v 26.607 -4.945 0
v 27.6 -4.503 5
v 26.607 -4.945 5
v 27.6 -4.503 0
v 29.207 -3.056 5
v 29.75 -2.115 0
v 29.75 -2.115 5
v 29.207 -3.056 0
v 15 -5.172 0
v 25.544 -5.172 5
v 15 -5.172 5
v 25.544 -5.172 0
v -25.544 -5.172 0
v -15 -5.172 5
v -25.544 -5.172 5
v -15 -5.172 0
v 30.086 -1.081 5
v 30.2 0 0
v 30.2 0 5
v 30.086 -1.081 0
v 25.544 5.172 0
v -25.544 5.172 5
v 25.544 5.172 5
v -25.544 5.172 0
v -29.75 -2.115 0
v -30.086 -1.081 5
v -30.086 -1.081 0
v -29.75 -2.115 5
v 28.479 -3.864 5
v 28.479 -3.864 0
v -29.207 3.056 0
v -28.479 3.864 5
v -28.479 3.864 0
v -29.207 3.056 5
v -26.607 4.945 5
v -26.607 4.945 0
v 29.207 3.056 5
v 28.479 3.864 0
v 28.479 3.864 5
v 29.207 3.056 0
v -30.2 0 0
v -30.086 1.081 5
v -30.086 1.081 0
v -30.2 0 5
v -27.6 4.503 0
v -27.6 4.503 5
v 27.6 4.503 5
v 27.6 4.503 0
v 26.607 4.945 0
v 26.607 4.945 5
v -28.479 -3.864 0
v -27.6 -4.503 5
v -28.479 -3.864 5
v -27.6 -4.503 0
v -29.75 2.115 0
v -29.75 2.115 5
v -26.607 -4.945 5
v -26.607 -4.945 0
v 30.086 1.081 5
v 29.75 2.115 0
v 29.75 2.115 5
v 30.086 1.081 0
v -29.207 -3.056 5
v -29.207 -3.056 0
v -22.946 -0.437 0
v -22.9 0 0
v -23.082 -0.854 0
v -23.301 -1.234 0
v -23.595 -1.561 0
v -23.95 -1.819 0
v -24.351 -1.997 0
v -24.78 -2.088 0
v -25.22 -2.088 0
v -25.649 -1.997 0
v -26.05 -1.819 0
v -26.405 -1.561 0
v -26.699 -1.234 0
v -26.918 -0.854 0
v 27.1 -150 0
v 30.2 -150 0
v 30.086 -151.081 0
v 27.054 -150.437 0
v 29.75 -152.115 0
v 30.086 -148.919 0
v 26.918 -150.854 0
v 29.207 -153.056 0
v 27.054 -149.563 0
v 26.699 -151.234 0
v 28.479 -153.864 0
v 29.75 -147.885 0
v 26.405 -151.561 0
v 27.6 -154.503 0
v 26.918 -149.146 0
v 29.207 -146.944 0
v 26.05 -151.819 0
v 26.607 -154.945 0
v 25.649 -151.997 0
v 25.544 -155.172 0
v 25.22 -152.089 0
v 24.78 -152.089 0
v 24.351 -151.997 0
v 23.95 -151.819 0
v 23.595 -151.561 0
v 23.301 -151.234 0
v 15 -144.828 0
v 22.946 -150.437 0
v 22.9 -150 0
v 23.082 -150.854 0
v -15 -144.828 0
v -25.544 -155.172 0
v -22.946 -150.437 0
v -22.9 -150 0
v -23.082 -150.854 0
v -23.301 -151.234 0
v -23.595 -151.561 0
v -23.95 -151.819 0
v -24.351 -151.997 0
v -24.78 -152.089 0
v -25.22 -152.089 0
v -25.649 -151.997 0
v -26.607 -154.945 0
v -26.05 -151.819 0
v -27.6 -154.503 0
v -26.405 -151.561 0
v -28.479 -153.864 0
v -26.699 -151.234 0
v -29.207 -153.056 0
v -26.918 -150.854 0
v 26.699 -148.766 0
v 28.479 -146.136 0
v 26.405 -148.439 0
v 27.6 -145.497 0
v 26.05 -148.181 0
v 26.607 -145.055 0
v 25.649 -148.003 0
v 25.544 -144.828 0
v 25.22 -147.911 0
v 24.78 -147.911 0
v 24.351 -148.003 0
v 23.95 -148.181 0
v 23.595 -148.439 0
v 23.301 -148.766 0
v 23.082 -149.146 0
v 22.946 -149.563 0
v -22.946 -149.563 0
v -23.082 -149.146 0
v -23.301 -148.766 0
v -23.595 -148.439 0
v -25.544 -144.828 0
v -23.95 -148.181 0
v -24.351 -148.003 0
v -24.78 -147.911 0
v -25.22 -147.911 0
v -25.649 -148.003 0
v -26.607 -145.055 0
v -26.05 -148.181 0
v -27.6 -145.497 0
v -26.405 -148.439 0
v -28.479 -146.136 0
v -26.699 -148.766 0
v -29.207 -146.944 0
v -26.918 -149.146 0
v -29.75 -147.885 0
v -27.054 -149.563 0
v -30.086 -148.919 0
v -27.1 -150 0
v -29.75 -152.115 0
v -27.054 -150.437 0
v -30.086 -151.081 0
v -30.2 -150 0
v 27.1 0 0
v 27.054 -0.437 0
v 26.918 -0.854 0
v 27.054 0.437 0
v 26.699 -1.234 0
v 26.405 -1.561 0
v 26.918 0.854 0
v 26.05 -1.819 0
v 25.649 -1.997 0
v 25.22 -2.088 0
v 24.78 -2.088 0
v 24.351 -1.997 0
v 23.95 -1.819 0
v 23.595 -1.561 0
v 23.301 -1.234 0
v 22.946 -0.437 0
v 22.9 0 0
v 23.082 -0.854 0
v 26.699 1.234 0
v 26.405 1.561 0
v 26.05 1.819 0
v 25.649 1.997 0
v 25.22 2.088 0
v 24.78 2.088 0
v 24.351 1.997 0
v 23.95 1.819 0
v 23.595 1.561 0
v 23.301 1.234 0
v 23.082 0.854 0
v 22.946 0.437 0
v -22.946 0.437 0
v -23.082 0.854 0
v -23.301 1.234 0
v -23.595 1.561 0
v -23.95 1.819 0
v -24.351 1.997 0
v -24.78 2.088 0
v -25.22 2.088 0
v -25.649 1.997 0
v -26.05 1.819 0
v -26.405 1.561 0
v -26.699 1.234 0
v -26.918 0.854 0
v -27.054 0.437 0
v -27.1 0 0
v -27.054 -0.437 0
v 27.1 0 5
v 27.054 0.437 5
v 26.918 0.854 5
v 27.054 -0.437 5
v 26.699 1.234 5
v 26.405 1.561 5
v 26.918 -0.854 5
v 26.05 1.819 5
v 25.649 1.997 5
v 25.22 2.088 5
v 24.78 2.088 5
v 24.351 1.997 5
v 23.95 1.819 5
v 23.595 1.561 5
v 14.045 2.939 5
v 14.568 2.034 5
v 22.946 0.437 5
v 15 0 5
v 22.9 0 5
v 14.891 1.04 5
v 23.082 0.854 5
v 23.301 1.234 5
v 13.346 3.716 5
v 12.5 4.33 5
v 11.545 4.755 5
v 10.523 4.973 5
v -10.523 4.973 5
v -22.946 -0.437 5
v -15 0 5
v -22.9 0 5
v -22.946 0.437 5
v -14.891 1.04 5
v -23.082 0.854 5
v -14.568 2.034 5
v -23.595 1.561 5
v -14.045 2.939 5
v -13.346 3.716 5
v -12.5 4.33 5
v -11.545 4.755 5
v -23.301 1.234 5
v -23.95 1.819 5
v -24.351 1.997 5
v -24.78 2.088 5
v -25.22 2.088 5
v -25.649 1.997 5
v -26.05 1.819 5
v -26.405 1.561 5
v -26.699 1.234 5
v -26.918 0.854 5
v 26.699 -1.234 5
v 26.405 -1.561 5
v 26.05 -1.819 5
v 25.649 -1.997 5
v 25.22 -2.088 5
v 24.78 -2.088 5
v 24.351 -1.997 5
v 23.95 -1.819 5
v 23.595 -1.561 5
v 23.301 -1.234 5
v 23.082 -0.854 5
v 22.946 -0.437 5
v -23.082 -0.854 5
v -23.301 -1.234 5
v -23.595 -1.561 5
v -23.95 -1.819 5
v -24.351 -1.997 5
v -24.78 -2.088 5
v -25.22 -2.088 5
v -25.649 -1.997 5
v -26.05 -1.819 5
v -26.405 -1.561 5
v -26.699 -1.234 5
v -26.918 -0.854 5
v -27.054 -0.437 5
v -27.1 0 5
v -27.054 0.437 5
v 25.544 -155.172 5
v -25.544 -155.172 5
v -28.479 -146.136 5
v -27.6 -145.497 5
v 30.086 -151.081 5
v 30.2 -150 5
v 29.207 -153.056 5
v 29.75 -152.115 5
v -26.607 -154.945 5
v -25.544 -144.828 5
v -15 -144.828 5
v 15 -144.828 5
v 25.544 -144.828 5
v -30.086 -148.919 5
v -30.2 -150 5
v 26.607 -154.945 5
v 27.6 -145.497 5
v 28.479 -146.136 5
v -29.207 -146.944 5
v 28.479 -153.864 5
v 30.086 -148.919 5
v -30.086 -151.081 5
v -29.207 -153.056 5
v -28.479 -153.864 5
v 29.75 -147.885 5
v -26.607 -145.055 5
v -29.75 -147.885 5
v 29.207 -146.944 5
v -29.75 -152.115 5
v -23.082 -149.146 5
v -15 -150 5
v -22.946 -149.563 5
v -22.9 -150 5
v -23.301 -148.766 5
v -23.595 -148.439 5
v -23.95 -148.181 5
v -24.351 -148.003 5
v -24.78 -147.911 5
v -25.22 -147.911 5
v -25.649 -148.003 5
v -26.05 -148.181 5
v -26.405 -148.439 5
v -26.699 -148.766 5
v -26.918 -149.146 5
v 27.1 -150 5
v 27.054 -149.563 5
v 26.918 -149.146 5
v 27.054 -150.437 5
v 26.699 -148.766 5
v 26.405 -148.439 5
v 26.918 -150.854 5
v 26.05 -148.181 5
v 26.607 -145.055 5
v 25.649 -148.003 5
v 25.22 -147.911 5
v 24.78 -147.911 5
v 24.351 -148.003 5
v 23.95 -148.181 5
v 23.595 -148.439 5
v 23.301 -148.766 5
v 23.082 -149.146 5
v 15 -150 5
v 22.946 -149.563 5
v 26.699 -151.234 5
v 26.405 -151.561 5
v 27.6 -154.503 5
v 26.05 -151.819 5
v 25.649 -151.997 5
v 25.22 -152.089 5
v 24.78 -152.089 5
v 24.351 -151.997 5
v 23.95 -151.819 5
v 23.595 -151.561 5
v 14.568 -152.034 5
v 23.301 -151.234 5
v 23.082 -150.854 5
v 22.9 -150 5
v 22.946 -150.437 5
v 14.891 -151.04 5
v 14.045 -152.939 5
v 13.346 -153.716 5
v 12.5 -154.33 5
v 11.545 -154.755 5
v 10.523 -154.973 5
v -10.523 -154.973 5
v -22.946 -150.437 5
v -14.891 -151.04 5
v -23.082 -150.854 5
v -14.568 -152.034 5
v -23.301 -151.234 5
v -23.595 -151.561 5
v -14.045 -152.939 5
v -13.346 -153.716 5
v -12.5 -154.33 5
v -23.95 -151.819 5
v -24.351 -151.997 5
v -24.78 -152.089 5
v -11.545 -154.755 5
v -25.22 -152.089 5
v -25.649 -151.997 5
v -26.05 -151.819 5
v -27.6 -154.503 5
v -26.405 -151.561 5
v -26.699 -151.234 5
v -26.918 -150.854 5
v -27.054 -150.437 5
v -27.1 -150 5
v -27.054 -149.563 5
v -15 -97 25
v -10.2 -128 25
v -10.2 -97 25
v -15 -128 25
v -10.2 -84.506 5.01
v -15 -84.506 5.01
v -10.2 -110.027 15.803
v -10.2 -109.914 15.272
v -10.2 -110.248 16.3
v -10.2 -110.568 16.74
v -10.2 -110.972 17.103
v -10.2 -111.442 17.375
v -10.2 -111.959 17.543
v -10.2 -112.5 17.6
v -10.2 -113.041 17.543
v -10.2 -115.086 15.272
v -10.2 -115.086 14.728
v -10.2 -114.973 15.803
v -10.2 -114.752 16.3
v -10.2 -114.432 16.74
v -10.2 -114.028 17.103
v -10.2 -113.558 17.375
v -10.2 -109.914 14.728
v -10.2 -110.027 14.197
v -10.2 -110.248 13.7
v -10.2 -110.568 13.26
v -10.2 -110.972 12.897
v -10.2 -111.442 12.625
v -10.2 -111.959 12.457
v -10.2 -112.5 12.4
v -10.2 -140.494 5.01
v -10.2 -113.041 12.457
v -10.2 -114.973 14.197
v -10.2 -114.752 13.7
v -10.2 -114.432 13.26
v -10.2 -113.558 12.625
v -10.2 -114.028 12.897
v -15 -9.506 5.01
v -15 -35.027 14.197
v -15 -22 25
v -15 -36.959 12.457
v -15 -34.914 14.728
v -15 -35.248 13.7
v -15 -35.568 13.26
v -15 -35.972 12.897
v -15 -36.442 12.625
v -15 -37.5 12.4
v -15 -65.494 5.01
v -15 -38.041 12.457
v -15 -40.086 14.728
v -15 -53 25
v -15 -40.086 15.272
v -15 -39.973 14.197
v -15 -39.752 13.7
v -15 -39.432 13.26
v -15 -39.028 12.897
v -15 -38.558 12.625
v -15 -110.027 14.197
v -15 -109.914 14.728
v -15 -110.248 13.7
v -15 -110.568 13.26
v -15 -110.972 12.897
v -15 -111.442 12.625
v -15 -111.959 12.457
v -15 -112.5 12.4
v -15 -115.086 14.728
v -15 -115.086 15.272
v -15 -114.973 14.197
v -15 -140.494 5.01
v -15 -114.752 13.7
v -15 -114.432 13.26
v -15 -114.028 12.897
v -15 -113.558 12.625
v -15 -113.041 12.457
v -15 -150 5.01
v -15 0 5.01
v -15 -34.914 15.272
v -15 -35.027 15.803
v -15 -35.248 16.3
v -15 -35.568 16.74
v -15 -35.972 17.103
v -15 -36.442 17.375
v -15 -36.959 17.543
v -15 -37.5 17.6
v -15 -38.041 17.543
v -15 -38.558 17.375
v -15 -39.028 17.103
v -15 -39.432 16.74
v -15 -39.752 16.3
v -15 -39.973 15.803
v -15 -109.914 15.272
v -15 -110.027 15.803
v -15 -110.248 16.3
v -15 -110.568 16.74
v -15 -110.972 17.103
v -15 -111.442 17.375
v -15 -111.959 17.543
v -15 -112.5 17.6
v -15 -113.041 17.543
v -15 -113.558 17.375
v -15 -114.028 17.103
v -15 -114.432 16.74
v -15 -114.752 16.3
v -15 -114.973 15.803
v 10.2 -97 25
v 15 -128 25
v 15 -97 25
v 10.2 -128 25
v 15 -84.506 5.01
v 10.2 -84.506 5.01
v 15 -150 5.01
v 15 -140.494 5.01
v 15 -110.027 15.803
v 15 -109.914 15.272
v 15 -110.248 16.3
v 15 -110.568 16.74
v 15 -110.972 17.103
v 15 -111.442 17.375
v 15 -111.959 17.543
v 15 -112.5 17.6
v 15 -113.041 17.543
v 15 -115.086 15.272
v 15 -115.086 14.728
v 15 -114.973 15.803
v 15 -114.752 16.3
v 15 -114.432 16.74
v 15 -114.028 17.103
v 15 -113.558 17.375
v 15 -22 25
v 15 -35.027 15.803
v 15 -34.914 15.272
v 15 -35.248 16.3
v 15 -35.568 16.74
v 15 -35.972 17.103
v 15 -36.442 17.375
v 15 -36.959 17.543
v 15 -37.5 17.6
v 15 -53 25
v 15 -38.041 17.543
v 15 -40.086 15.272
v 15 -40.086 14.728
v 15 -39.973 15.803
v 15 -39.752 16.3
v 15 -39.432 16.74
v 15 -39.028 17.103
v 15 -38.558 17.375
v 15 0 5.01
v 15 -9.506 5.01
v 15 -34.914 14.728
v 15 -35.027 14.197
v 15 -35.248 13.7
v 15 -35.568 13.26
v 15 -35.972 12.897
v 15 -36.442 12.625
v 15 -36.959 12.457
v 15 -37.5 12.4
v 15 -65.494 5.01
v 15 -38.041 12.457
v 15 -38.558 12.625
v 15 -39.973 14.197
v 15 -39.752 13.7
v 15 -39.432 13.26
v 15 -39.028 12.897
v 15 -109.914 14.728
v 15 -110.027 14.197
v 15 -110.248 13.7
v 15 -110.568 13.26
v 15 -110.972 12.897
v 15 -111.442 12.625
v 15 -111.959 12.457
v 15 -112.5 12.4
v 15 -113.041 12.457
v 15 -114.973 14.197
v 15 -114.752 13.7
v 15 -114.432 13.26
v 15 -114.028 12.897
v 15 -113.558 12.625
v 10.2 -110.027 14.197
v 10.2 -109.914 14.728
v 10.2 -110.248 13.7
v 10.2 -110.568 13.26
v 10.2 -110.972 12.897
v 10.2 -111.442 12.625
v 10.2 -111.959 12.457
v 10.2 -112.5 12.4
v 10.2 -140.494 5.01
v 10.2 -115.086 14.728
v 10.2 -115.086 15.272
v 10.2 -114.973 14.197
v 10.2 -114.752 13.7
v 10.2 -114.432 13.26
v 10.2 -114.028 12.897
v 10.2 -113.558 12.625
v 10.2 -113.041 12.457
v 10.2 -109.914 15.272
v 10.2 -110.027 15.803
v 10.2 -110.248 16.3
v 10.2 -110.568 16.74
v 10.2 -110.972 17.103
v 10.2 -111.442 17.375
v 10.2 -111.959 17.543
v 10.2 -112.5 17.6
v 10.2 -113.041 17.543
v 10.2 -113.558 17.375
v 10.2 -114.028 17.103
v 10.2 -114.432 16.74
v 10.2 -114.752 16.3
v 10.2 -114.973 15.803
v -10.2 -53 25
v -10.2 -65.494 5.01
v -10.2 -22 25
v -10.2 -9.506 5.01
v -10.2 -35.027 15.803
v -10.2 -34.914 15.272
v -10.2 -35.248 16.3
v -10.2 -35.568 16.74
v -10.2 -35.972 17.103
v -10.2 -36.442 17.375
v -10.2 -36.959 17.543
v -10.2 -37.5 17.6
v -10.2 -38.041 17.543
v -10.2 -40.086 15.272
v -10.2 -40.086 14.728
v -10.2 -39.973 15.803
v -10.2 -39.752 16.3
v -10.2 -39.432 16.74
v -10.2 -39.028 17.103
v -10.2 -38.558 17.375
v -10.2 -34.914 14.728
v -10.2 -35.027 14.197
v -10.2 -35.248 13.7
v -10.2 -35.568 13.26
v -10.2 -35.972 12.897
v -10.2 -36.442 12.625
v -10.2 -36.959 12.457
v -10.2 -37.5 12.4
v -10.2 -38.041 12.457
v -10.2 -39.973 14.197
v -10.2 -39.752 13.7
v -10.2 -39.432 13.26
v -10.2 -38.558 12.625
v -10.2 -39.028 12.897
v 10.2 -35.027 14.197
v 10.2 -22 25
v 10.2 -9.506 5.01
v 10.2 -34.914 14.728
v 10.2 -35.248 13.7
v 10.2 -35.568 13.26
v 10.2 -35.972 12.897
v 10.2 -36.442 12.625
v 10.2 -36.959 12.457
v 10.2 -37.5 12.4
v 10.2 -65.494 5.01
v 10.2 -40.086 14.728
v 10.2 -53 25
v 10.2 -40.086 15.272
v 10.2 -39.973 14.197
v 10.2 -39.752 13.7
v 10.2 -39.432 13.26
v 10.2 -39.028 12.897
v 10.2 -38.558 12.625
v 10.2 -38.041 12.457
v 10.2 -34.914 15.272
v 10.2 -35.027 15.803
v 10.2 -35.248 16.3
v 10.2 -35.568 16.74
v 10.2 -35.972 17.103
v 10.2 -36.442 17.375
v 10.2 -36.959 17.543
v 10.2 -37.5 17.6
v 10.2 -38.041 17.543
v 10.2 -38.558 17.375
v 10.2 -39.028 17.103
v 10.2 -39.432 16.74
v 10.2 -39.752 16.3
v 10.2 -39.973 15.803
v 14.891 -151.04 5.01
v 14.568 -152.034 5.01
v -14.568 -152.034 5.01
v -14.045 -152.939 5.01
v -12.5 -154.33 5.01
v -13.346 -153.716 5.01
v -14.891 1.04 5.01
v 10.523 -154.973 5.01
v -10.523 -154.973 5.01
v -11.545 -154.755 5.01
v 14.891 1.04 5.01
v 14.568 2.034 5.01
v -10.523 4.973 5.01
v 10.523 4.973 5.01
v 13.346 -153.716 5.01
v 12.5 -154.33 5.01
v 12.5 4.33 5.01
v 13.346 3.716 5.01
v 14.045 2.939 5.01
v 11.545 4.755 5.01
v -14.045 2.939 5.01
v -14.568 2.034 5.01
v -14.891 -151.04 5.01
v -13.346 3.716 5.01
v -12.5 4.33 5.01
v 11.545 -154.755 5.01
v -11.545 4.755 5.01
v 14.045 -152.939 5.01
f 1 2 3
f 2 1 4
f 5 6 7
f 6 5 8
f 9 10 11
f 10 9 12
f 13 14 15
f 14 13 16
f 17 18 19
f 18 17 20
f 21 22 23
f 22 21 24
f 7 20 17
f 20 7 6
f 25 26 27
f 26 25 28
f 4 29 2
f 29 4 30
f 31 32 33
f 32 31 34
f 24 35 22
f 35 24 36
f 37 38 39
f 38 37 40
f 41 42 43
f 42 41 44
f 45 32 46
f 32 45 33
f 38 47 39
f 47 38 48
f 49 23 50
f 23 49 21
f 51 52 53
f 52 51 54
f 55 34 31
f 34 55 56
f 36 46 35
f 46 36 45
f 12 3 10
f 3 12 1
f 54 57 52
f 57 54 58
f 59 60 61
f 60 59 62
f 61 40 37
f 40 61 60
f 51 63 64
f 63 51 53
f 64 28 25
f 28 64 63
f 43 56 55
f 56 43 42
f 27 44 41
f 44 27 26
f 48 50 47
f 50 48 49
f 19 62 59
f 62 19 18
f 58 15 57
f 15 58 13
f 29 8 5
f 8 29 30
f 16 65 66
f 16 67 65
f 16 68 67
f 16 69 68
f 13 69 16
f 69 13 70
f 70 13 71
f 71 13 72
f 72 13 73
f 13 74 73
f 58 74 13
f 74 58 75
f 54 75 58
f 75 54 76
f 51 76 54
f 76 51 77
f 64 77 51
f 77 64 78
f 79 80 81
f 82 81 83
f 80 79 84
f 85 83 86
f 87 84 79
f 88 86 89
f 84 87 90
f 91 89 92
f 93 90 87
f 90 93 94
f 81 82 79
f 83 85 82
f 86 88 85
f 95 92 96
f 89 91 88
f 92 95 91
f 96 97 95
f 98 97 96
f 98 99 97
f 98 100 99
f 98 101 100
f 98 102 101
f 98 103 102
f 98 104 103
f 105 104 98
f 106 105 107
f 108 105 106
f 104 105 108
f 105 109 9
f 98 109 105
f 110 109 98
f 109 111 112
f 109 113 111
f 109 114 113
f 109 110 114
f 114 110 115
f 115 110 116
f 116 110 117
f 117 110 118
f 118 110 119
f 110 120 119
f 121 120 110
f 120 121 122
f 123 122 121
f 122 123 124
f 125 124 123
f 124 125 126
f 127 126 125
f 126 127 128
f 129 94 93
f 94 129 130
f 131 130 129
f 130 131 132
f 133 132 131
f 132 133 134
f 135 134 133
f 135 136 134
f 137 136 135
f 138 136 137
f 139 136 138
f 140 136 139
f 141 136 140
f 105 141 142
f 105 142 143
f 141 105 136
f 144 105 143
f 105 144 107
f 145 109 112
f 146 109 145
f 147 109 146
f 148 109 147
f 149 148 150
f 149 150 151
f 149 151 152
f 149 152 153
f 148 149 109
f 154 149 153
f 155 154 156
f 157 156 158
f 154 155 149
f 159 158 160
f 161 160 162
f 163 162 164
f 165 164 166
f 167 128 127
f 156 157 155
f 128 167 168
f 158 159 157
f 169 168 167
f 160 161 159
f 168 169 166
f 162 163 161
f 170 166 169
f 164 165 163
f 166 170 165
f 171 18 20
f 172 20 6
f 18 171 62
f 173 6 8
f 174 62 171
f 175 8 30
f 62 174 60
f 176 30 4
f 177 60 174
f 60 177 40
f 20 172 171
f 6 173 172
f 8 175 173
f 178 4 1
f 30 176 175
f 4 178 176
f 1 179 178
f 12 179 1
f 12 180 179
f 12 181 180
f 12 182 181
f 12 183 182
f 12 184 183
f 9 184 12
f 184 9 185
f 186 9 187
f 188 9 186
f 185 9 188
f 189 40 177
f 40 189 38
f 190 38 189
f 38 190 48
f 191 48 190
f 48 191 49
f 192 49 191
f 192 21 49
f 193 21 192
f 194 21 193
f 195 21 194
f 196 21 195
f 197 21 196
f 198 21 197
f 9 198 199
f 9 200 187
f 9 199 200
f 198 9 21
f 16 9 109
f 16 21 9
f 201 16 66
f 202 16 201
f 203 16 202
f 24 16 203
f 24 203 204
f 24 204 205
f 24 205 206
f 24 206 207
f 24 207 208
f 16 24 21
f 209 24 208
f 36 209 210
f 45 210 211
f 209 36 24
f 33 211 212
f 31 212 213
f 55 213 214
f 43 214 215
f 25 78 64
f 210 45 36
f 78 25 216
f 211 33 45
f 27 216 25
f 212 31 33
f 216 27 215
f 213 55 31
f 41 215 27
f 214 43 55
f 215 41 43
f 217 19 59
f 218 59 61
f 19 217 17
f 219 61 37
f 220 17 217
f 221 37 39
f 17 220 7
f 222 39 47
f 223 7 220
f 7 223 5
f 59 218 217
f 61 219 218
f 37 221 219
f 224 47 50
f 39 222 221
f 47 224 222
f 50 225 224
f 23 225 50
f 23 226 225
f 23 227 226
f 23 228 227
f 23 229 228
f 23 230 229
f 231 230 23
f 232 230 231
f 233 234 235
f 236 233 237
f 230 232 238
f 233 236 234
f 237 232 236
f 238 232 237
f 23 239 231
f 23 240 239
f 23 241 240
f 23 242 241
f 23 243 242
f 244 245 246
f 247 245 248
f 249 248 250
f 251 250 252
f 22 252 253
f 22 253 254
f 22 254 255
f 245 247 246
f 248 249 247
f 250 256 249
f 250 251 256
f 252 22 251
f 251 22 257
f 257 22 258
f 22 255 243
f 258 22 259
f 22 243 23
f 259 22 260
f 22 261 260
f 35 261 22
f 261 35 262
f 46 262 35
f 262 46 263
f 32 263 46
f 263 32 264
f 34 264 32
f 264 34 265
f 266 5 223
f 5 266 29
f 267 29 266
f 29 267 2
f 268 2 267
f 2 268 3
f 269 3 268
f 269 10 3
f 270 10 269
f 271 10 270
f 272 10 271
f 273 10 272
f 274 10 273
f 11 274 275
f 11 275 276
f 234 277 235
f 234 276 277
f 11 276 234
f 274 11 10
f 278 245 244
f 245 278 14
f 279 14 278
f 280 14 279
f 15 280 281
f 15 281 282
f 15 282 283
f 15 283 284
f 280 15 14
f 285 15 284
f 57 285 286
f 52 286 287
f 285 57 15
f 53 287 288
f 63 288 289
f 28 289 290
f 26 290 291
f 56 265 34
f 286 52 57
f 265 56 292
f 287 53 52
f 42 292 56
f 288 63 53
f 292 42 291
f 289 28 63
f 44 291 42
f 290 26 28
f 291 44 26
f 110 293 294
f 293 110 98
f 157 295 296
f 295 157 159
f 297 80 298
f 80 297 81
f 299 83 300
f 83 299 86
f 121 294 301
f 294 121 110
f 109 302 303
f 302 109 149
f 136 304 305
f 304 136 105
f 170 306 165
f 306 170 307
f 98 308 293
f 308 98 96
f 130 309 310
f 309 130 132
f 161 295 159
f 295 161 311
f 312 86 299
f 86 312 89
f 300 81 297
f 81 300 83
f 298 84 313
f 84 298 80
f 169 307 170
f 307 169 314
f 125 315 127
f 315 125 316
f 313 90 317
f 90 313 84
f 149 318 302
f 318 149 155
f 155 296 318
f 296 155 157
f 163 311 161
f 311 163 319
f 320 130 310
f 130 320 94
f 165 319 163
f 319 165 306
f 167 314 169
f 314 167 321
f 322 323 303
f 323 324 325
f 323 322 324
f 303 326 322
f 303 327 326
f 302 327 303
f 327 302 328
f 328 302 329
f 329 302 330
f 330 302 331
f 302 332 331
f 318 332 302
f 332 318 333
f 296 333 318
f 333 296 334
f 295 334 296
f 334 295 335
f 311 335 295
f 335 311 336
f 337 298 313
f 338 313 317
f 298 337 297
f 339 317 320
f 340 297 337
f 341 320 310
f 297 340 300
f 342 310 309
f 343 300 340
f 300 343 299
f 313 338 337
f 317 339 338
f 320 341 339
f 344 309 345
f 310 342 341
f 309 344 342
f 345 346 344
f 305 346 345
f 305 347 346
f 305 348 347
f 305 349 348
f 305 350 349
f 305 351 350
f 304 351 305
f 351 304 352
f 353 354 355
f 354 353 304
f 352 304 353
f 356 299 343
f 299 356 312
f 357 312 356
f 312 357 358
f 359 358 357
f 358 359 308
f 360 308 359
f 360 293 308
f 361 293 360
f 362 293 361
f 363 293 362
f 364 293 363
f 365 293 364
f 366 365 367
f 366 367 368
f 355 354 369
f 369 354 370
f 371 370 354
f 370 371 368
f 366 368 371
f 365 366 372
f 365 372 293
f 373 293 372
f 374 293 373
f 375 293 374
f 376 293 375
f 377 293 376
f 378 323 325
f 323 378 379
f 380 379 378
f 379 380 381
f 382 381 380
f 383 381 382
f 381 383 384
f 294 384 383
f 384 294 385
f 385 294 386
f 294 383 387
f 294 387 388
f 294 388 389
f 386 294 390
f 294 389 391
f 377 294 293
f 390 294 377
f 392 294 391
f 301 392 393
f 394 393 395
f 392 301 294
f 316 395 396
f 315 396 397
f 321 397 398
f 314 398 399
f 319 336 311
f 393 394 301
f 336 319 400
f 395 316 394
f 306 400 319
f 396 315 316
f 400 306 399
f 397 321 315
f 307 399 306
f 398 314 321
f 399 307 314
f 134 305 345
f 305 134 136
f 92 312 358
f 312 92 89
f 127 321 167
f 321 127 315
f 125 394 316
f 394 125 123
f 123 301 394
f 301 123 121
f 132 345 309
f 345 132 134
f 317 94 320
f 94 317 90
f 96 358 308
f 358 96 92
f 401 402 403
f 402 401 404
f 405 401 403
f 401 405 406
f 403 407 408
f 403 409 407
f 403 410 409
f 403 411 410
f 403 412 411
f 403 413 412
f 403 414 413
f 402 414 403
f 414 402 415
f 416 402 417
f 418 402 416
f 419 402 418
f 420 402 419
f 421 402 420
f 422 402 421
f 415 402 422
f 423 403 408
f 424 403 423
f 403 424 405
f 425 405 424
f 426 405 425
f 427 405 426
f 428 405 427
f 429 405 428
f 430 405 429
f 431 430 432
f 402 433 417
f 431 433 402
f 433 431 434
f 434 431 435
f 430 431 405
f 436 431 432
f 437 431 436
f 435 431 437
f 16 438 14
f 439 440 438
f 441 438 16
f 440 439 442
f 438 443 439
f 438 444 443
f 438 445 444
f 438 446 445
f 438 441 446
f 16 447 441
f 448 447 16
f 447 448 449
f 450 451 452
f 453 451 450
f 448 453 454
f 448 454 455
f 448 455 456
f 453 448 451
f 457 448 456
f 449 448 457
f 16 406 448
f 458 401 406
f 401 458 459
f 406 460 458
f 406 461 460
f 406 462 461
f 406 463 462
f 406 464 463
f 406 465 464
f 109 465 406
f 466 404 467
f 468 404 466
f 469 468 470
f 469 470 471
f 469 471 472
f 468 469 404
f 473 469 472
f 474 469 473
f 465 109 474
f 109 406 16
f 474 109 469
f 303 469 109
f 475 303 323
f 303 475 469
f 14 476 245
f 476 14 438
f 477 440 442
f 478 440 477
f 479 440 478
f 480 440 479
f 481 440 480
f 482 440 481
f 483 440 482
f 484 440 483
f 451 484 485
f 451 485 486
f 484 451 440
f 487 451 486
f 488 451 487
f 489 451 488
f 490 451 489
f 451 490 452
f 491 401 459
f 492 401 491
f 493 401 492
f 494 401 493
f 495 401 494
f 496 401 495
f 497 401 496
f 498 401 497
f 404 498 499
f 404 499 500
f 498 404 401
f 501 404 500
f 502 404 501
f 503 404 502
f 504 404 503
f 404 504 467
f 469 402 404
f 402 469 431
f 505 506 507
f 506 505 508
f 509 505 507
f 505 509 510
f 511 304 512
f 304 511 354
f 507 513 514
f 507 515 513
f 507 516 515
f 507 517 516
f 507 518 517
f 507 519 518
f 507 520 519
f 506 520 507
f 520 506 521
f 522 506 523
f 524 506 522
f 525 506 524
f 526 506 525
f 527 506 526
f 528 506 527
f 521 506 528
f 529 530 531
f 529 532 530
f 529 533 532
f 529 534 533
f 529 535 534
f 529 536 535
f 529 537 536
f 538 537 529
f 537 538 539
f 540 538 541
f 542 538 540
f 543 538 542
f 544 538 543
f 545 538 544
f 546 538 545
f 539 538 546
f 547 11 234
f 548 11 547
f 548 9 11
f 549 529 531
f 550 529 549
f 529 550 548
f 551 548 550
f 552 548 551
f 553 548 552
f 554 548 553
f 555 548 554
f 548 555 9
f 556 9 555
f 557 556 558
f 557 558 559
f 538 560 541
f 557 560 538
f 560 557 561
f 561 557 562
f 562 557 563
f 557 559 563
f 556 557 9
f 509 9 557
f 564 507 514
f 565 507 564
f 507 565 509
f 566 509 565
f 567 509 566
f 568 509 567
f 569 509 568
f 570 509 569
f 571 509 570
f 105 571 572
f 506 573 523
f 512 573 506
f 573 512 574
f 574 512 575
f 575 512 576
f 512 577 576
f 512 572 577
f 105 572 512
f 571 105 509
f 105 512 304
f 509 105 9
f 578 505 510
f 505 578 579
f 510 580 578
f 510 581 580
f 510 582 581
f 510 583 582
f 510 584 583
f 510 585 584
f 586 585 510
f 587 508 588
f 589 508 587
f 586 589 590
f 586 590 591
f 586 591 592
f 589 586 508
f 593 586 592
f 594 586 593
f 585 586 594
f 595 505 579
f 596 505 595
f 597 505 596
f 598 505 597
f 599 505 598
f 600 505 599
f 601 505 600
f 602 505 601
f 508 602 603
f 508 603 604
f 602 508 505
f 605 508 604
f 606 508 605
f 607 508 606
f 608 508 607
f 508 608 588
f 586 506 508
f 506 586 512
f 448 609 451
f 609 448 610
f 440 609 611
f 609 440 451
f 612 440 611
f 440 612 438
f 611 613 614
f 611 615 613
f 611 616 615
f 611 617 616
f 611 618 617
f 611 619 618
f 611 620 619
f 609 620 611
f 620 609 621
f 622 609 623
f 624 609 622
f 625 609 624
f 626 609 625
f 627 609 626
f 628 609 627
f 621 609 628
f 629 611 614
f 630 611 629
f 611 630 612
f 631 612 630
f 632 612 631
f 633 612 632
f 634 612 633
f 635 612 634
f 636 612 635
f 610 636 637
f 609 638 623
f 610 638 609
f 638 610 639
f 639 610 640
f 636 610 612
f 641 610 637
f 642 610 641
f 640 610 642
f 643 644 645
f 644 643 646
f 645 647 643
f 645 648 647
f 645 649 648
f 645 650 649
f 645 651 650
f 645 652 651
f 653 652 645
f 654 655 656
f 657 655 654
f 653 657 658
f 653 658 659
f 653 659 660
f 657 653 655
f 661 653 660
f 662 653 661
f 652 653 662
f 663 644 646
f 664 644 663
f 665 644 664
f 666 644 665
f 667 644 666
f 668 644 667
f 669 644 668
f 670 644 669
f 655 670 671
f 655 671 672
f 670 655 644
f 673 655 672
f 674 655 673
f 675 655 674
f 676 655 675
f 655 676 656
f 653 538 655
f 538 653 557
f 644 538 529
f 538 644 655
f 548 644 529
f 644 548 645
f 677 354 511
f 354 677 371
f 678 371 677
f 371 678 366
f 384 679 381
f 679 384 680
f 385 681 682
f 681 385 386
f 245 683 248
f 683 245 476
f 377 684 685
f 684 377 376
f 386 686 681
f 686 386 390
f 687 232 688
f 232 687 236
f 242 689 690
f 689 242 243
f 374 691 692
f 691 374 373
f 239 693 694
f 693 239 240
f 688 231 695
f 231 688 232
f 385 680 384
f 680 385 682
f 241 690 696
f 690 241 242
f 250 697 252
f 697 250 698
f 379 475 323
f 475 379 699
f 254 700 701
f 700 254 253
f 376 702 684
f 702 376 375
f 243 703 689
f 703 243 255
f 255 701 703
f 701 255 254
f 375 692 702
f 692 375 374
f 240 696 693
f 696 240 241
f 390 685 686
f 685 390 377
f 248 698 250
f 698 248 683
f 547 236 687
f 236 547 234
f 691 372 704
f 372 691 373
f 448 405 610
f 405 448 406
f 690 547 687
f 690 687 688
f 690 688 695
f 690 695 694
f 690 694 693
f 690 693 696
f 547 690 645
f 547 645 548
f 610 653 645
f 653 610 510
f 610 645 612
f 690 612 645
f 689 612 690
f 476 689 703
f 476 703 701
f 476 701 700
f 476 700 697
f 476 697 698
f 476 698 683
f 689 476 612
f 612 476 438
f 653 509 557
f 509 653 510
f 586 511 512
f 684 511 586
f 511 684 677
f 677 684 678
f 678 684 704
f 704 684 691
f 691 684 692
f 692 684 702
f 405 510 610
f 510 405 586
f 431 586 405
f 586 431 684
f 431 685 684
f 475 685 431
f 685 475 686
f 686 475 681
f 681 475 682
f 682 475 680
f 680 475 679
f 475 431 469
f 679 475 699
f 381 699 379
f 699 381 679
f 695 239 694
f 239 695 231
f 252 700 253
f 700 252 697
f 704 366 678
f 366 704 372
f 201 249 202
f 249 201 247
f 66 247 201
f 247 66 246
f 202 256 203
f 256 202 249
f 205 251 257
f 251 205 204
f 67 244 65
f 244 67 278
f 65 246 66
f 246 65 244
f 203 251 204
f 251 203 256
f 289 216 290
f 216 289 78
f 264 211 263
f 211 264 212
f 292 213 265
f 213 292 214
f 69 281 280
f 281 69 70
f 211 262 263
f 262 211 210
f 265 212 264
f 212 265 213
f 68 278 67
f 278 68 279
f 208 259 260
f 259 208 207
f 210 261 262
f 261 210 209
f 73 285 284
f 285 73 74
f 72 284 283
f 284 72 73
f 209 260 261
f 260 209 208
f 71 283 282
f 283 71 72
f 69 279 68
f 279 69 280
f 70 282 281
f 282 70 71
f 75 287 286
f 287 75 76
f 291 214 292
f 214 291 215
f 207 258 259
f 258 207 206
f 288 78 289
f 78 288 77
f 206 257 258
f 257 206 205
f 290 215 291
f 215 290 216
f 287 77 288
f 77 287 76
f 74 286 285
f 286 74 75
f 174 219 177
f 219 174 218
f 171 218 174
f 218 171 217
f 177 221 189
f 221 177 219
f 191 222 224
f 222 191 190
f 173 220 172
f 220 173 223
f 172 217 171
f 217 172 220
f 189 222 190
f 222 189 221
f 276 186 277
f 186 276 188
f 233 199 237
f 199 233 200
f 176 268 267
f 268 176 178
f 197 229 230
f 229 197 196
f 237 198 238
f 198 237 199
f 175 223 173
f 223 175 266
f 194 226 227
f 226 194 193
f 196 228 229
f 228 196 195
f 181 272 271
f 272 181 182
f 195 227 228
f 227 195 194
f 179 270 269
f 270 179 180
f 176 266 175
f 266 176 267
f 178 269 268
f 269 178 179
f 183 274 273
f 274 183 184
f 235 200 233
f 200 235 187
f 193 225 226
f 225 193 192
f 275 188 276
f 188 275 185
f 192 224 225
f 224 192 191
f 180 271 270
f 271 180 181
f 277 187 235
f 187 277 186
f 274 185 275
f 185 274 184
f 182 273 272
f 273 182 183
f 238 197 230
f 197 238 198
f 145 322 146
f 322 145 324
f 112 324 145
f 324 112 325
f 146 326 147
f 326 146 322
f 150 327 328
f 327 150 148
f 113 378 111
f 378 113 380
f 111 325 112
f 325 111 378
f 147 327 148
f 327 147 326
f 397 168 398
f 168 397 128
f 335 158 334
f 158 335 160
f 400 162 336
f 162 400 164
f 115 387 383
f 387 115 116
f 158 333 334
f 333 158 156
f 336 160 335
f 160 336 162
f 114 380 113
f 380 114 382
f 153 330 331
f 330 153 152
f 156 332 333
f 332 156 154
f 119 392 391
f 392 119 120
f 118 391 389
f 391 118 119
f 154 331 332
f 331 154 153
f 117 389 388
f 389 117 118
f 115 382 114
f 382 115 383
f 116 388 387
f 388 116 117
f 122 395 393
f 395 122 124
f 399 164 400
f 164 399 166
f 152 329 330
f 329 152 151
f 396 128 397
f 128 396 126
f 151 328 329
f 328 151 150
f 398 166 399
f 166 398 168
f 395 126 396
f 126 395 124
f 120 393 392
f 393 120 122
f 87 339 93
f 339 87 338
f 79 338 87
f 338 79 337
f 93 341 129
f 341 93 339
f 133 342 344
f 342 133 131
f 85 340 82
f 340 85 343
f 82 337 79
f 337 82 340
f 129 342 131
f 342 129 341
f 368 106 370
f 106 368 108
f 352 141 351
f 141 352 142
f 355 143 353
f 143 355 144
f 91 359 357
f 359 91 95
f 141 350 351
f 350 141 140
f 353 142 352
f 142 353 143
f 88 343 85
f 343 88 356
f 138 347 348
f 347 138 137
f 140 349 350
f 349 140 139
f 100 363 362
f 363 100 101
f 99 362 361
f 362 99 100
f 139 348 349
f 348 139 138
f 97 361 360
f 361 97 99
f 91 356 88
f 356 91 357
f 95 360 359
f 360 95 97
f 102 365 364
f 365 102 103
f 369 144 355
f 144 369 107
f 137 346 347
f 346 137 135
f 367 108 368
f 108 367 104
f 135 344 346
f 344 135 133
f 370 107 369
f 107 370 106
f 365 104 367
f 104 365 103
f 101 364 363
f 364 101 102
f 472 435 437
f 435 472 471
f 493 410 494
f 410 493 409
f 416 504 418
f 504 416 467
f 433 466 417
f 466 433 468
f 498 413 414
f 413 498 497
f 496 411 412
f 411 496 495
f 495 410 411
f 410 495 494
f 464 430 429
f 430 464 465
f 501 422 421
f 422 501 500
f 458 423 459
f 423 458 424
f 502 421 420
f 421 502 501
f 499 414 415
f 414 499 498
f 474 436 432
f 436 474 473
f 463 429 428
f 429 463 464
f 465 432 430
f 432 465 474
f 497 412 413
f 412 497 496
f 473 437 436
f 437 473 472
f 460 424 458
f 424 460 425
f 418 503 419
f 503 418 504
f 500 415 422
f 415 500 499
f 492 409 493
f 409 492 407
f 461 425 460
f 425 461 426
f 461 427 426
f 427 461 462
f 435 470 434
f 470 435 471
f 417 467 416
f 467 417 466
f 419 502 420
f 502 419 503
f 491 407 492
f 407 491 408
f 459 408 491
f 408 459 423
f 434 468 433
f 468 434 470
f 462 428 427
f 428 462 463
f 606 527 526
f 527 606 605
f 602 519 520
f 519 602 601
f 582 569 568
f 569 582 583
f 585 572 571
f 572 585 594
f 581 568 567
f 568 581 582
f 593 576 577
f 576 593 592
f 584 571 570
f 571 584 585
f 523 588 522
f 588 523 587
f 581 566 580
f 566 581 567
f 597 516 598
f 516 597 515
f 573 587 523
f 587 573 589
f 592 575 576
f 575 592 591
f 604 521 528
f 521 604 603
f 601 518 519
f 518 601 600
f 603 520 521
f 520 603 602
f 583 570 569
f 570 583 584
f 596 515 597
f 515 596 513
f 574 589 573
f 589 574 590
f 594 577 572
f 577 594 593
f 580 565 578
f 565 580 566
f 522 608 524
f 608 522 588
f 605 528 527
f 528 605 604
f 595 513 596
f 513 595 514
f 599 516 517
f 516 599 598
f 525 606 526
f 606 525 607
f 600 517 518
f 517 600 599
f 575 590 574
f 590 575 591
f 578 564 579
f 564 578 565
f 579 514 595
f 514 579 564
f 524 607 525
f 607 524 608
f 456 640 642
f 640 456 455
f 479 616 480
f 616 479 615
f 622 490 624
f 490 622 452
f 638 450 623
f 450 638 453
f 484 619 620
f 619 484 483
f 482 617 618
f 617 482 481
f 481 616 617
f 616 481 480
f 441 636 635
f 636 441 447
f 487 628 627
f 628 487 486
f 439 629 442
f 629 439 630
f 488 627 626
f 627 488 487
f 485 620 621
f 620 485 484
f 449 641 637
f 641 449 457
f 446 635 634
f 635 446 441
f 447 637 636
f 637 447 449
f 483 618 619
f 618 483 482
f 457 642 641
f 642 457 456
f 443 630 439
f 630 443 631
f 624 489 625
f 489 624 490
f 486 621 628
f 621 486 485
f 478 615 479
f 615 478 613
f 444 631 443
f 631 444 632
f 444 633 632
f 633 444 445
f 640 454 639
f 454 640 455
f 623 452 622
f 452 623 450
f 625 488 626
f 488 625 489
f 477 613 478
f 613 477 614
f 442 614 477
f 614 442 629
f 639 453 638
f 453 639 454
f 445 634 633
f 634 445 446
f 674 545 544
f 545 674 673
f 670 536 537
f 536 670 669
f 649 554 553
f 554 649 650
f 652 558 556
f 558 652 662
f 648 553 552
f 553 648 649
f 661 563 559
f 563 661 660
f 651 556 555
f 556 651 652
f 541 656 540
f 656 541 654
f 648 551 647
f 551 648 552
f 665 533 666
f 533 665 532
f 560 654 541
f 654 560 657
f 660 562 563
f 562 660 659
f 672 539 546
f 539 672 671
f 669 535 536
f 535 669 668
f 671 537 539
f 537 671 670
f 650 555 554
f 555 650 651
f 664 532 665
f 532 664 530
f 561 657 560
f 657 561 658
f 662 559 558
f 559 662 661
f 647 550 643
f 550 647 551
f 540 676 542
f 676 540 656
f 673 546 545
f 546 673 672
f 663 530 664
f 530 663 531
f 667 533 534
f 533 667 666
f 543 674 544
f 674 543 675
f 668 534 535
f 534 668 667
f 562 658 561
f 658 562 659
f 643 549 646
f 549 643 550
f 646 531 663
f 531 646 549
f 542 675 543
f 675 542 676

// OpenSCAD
// file: bolts.scad
m2_diameter = 2.2;
m2_nut_diameter = 9999;
m2_nut_thickness = 1.7;
m2_tap_diameter = 9999;

m3_diameter = 3.3 ;
m3_cap_diameter = 5.7 ;
m3_cap_thickness = 3.0 ;
m3_nut_diameter = 6.6 ;
m3_nut_thickness = 2.5 ;
m3_tap_diameter = 2.5 ;

m4_diameter = 4.2 ;
m4_nut_diameter = 7.9 ;
m4_nut_thickness = 2.5 ;
m4_tap_diameter = 3.4 ;

m5_diameter = 5.2 ;
m5_cap_length = 5 ;
m5_nut_diameter = 9.4 ;
m5_nut_thickness = 2.7 ;
m5_tap_diameter = 4.3 ;
// main file
include <bolts.scad>



back_horiz_separation = 50 ;
back_vert_separation = 150 ;

back_mount_separation = 55 ;

smps_bolt = m4_diameter;
mount_bolt = m5_diameter;

$fn = 30 ;

module smps_mount() {
	difference() {
		union() {
			
			for( j = [0,-1]) hull() for( i = [-1,1] ) {
				translate([i*back_horiz_separation/2,j*back_vert_separation,0]) 
					cylinder( r = mount_bolt, h = 5 );
			}
			translate([0,0,2.5]) {
				translate([0,-back_vert_separation/2,0]) minkowski() {
					cube( [20,back_vert_separation,5],center = true );
					cylinder(r=5,h=0.01);
				}
				for( j =[-1,1] ) for( i=[-1,1] ) hull() {
					translate([i*12.6,-back_vert_separation/2+j*back_vert_separation/2-j*10,2])
						cube( [4.8,1,1],center = true );
					translate([i*12.6,-back_vert_separation/2+j*10,2])
				#		cube( [4.8,1,1],center = true );
					translate([i*12.6,-back_vert_separation/2+j*back_vert_separation/4+15,12.5])
						cube( [4.8,1,20],center = true );
					translate([i*12.6,-back_vert_separation/2+j*back_vert_separation/4-15,12.5])
						cube( [4.8,1,20],center = true );
				}
			}
		}
		
		
		for( j = [0,-1]) for( i = [-1,1] ) {
			translate([i*back_horiz_separation/2,j*back_vert_separation,-0.1]) 
				cylinder( r = smps_bolt/2, h = 5.2 );
		}
		for( j =[-1,1] ) for( i=[-1,1] ) { translate([i*9.9,-back_vert_separation/2+j*back_vert_separation/4,15])
			rotate([0,i*90,0])
		#		cylinder( r = mount_bolt/2, h = 5.2 );
		}
	}
}

smps_mount();
/*rotate([0,0,180])
translate([0,20,0])
smps_mount();*/
